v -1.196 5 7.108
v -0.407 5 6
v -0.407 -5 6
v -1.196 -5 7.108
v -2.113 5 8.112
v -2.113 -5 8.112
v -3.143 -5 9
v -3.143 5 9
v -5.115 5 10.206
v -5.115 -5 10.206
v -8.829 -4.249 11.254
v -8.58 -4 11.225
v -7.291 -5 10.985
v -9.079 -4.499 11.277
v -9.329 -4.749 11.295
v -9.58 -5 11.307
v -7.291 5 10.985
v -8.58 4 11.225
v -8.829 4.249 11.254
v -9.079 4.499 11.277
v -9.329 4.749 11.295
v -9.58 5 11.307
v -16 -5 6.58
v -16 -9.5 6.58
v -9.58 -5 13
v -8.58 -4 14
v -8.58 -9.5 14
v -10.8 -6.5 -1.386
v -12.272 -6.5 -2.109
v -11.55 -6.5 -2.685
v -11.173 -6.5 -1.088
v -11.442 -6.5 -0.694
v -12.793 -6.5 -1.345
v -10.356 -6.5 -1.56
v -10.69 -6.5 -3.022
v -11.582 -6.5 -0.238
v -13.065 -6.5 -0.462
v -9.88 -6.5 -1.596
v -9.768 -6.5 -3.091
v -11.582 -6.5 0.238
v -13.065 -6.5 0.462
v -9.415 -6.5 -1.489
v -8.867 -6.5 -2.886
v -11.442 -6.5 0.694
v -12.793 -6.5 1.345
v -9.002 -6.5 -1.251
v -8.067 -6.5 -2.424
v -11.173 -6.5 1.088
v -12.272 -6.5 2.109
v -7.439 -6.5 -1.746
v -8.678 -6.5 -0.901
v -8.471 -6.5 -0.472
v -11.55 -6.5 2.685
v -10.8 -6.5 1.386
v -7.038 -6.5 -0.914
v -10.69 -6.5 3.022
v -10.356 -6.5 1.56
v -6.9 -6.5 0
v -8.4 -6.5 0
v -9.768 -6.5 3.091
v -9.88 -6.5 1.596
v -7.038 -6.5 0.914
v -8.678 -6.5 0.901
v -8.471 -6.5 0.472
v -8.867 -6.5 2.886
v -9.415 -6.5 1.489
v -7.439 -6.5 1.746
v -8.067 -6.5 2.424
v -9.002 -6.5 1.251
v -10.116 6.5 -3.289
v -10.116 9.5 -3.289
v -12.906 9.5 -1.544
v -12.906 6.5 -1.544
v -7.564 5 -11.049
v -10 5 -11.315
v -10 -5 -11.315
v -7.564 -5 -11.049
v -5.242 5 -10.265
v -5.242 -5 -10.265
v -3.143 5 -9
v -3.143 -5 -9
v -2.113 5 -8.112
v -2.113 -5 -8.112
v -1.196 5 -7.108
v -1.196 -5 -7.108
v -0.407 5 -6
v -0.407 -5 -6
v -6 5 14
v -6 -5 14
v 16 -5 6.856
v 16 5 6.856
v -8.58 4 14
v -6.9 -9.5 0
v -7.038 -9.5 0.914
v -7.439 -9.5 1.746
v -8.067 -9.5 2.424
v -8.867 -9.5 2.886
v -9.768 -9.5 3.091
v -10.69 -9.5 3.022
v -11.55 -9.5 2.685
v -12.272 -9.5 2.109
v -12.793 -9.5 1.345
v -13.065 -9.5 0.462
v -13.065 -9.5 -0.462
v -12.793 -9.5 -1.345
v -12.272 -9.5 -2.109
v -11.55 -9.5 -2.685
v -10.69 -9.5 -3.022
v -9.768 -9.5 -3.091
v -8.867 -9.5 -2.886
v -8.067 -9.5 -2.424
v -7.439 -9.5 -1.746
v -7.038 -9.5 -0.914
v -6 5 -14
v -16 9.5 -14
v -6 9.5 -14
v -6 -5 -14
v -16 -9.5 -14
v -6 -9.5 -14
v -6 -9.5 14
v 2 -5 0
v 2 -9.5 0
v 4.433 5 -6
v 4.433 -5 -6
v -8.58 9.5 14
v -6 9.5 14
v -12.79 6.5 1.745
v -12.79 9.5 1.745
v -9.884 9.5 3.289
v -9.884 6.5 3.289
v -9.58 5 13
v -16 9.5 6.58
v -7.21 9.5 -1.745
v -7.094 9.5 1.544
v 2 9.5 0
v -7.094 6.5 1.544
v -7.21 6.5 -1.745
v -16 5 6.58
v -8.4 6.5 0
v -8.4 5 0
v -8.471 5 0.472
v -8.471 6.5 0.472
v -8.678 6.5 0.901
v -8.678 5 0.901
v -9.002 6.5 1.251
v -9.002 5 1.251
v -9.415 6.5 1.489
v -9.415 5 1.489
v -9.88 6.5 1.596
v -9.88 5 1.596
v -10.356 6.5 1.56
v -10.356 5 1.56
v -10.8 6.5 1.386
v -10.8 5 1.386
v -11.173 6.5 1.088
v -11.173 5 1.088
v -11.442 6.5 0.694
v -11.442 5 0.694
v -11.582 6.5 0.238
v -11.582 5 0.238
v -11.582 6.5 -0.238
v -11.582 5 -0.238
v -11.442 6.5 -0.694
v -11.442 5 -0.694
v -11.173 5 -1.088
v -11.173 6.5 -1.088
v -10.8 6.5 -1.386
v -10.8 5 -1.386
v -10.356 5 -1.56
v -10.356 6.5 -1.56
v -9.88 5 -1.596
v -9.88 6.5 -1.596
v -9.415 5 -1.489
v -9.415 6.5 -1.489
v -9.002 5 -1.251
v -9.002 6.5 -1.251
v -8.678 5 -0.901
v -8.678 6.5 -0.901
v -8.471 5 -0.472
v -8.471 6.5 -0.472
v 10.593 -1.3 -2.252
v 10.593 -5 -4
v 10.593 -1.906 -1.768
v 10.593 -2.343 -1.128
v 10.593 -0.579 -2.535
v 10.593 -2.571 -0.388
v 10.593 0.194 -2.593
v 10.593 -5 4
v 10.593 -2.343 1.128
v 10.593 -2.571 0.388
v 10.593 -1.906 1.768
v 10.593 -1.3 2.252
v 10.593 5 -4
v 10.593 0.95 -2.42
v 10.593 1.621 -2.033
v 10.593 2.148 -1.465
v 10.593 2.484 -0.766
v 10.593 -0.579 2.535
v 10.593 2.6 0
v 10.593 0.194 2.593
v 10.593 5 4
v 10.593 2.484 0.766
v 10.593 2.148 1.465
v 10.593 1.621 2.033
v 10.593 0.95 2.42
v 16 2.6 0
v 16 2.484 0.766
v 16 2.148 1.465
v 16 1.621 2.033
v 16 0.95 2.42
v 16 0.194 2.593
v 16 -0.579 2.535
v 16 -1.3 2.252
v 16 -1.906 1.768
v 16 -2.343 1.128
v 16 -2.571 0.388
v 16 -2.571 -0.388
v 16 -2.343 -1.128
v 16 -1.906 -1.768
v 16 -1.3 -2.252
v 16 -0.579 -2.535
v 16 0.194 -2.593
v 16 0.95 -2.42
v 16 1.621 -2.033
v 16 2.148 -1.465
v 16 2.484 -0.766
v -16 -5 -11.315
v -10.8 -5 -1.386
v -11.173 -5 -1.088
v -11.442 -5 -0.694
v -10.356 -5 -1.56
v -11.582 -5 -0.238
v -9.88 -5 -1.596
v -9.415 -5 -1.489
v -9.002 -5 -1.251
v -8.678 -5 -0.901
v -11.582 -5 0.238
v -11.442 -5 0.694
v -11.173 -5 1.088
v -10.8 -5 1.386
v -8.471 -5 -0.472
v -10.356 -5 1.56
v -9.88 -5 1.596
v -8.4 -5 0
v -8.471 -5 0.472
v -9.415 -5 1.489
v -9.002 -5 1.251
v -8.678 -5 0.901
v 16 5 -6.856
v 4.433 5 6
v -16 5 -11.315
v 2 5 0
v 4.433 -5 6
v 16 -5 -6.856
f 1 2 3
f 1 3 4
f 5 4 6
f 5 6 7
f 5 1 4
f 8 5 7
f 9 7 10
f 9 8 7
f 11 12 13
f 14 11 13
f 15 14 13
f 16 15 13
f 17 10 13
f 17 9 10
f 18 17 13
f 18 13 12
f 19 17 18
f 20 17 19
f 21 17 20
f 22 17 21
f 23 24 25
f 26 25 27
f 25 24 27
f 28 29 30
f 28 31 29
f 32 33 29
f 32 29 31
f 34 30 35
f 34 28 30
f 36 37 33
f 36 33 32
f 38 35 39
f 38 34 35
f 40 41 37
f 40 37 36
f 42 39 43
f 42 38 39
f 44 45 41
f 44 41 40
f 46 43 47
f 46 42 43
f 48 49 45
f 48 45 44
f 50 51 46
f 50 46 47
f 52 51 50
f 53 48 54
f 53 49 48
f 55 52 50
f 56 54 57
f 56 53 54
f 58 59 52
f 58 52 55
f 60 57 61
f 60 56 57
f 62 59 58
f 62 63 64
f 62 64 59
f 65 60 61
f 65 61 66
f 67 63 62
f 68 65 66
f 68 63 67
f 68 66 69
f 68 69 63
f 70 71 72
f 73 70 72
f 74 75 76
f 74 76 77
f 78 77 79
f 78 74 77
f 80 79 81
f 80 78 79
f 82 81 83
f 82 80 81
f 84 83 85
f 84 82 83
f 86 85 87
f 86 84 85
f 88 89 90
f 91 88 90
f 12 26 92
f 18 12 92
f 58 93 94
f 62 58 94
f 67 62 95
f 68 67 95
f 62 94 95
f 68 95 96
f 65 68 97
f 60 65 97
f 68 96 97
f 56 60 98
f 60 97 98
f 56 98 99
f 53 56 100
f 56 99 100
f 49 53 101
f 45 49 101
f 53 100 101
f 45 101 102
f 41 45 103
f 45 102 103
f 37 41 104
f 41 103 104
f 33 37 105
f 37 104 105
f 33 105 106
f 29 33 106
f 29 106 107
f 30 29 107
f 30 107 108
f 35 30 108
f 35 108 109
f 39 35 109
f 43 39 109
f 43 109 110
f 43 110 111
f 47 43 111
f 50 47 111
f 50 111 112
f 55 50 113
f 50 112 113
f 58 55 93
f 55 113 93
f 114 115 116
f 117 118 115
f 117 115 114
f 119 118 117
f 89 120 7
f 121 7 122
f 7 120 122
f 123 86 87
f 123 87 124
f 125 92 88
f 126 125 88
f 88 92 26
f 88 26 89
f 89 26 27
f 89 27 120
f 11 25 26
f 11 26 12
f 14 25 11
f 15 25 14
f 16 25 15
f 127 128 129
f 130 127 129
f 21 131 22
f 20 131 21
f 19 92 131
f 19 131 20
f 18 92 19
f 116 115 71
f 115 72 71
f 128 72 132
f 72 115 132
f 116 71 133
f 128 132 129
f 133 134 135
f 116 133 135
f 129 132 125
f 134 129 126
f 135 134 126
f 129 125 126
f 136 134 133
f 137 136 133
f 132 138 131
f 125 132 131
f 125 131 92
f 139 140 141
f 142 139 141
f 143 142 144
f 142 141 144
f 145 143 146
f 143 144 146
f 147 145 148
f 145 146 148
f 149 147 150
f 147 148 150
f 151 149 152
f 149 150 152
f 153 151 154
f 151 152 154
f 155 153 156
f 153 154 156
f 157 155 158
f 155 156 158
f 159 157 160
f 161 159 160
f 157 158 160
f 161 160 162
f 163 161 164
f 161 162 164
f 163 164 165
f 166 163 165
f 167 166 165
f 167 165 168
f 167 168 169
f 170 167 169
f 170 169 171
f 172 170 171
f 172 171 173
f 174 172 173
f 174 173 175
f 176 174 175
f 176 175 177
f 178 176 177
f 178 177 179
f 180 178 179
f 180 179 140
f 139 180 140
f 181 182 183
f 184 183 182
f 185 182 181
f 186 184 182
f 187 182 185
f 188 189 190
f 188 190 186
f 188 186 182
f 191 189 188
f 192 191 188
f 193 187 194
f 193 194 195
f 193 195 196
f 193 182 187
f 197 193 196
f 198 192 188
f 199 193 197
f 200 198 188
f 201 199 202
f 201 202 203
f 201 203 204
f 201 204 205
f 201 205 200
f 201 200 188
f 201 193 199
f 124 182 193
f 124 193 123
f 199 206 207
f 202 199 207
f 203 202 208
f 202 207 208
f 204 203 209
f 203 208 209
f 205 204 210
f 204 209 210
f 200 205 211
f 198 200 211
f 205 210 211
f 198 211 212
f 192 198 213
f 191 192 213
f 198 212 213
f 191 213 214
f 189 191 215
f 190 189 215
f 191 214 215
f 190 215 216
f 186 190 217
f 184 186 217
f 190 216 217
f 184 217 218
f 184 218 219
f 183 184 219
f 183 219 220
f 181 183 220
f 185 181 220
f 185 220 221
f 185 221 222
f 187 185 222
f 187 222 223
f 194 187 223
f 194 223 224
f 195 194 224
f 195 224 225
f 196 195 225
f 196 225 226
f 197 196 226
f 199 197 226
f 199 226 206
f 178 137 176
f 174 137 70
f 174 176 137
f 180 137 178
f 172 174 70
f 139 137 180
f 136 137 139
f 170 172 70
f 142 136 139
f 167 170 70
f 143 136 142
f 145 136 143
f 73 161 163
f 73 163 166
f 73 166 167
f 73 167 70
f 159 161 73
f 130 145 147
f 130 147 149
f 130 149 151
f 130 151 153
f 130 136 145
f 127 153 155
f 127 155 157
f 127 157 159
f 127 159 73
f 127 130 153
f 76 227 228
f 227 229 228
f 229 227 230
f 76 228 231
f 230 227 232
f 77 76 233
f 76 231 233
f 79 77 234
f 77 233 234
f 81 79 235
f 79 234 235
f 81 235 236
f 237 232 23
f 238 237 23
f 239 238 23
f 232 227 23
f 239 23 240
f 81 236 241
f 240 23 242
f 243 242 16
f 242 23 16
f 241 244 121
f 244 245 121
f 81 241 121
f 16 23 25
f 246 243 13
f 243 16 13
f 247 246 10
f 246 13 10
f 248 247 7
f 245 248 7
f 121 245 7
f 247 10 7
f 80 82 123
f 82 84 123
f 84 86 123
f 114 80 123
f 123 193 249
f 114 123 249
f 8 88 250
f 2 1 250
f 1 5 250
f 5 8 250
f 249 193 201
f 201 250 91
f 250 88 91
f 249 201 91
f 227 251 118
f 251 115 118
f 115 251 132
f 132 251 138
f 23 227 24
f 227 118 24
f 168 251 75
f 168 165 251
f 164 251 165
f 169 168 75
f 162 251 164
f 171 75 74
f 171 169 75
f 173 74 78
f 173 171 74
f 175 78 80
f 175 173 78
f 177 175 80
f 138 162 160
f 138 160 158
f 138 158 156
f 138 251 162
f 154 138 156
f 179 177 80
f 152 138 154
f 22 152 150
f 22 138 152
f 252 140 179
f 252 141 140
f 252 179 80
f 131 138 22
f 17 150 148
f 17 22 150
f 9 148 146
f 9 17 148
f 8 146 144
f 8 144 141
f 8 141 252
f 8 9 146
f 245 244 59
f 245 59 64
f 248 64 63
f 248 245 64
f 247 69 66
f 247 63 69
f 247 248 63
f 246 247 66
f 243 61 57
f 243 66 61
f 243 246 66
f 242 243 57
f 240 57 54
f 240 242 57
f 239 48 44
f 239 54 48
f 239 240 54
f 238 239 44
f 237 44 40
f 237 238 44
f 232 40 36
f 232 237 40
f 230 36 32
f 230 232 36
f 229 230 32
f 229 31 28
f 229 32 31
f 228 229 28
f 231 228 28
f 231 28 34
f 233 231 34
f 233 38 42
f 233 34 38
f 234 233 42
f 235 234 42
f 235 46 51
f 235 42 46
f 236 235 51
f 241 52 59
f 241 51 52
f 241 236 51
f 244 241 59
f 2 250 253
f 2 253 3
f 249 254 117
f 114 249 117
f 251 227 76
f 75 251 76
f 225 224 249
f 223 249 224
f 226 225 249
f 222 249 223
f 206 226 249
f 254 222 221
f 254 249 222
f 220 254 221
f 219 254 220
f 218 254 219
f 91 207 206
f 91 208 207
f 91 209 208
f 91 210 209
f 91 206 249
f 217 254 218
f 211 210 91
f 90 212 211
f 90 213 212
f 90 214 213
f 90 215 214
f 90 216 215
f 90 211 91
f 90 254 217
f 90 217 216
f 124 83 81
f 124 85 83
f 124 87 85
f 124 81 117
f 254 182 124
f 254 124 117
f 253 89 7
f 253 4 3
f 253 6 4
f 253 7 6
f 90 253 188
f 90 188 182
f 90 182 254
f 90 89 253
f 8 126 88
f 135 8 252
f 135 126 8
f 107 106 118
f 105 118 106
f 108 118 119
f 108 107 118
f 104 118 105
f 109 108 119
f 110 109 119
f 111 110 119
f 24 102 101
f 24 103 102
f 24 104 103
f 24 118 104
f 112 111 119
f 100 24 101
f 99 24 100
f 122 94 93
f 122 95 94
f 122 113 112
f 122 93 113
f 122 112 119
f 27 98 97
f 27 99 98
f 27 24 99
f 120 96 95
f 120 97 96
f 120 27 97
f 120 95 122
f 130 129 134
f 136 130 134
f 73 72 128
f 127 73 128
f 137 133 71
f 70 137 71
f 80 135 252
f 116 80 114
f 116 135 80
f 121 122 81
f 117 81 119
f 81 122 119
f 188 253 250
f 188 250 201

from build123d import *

# Parameters (mm, degrees)
F0_W      = 32
F0_H      = 28
F0_R      = 1.6
F1_DEPTH  = 9.5
F3_DEPTH  = 4.5
F5_DEPTH  = 5
F8_R      = 2.6
F9_DEPTH  = 25
F11_DEPTH = 3
F12_R     = 3.1
F13_DEPTH = 3
F15_DEPTH = 25
F17_DEPTH = 10
F18_W     = 7.420289278
F18_H     = 10
F19_DEPTH = 5
F21_DEPTH = 25
F22_SIZE  = 1


with BuildPart() as f1:
    # F0 (on Front) → F1 (new body)
    with BuildSketch(Plane.XZ):
        Rectangle(F0_W, F0_H)
        with Locations((-10, 0)):
            Circle(F0_R, mode=Mode.SUBTRACT)
    extrude(amount=F1_DEPTH)

    # F2 (on face) → F3 (cut)
    with BuildSketch(Plane.XZ.offset(9.5)):
        Polygon((16, -14), (16, 14), (-6, 14), (2, 0), (-6, -14), align=None)
    extrude(amount=-F3_DEPTH, mode=Mode.SUBTRACT)

    # F4 (on face) → F5 (cut, through all)
    with BuildSketch(Plane.XZ.offset(5)):
        with BuildLine():
            Line((10.5927268367, 6), (-0.4072731633, 6))
            ThreePointArc((-0.4072731633, 6), (-4.516718781, 9.8971730932), (-10, 11.314610385))
            Line((-10, 11.314610385), (-20, 11.314610385))
            Line((-20, 11.314610385), (-20, -11.314610385))
            Line((-20, -11.314610385), (-10, -11.314610385))
            ThreePointArc((-10, -11.314610385), (-4.516718781, -9.8971730932), (-0.4072731633, -6))
            Line((-0.4072731633, -6), (10.5927268367, -6))
            Line((10.5927268367, -6), (10.5927268367, 6))
        make_face()
    extrude(amount=-F5_DEPTH, mode=Mode.SUBTRACT)

    # F7: F1 across plane


with BuildPart() as f1_1:
    add(f1.part)
    add(f1.part.mirror(Plane.XZ))

    # F8 (on face) → F9 (cut)
    with BuildSketch(Plane.YZ.offset(16)):
        Circle(F8_R)
    extrude(amount=-F9_DEPTH, mode=Mode.SUBTRACT)

    # F10 (on face) → F11 (cut)
    with BuildSketch(Plane(origin=(0, 9.5, 0), x_dir=(-1, 0, 0), z_dir=(0, 1, 0))):
        Polygon((10.1159347913, -3.2888537706), (12.9061983103, -1.5440244109), (12.790263519, 1.7448293597), (9.8840652087, 3.2888537706), (7.0938016897, 1.5440244109), (7.209736481, -1.7448293597), align=None)
    extrude(amount=-F11_DEPTH, mode=Mode.SUBTRACT)

    # F12 (on face) → F13 (cut)
    with BuildSketch(Plane.XZ.offset(9.5)):
        with Locations((-10, 0)):
            Circle(F12_R)
    extrude(amount=-F13_DEPTH, mode=Mode.SUBTRACT)

    # F14 (on face) → F15 (cut)
    with BuildSketch(Plane.XZ.offset(5)):
        Polygon((16, 6.8564745598), (16, 14), (-6, 14), align=None)
        Polygon((16, -6.8564745598), (-6, -14), (16, -14), align=None)
    extrude(amount=-F15_DEPTH, mode=Mode.SUBTRACT)

    # F16 (on face) → F17 (join, through all)
    with BuildSketch(Plane.XZ.offset(5)):
        Polygon((10.5927268367, 6), (4.4333031224, 6), (10.5927268367, 4), align=None)
        Polygon((4.4333031224, -6), (10.5927268367, -6), (10.5927268367, -4), align=None)
    extrude(amount=-F17_DEPTH)

    # F18 (on face) → F19 (cut)
    with BuildSketch(Plane.XY.offset(14)):
        with Locations((-12.289855361, 0)):
            Rectangle(F18_W, F18_H)
    extrude(amount=-F19_DEPTH, mode=Mode.SUBTRACT)

    # F20 (on face) → F21 (cut)
    with BuildSketch(Plane.XZ.offset(9.5)):
        Polygon((-16, 6.579710722), (-8.579710722, 14), (-16, 14), align=None)
    extrude(amount=-F21_DEPTH, mode=Mode.SUBTRACT)

    # F22
    f22_edges = [f1_1.edges().sort_by_distance(p)[0] for p in [
        (-8.579711, -5, 12.612557),
        (-8.579711, 5, 12.612557),
    ]]
    chamfer(f22_edges, length=F22_SIZE)


solid = f1_1.part
